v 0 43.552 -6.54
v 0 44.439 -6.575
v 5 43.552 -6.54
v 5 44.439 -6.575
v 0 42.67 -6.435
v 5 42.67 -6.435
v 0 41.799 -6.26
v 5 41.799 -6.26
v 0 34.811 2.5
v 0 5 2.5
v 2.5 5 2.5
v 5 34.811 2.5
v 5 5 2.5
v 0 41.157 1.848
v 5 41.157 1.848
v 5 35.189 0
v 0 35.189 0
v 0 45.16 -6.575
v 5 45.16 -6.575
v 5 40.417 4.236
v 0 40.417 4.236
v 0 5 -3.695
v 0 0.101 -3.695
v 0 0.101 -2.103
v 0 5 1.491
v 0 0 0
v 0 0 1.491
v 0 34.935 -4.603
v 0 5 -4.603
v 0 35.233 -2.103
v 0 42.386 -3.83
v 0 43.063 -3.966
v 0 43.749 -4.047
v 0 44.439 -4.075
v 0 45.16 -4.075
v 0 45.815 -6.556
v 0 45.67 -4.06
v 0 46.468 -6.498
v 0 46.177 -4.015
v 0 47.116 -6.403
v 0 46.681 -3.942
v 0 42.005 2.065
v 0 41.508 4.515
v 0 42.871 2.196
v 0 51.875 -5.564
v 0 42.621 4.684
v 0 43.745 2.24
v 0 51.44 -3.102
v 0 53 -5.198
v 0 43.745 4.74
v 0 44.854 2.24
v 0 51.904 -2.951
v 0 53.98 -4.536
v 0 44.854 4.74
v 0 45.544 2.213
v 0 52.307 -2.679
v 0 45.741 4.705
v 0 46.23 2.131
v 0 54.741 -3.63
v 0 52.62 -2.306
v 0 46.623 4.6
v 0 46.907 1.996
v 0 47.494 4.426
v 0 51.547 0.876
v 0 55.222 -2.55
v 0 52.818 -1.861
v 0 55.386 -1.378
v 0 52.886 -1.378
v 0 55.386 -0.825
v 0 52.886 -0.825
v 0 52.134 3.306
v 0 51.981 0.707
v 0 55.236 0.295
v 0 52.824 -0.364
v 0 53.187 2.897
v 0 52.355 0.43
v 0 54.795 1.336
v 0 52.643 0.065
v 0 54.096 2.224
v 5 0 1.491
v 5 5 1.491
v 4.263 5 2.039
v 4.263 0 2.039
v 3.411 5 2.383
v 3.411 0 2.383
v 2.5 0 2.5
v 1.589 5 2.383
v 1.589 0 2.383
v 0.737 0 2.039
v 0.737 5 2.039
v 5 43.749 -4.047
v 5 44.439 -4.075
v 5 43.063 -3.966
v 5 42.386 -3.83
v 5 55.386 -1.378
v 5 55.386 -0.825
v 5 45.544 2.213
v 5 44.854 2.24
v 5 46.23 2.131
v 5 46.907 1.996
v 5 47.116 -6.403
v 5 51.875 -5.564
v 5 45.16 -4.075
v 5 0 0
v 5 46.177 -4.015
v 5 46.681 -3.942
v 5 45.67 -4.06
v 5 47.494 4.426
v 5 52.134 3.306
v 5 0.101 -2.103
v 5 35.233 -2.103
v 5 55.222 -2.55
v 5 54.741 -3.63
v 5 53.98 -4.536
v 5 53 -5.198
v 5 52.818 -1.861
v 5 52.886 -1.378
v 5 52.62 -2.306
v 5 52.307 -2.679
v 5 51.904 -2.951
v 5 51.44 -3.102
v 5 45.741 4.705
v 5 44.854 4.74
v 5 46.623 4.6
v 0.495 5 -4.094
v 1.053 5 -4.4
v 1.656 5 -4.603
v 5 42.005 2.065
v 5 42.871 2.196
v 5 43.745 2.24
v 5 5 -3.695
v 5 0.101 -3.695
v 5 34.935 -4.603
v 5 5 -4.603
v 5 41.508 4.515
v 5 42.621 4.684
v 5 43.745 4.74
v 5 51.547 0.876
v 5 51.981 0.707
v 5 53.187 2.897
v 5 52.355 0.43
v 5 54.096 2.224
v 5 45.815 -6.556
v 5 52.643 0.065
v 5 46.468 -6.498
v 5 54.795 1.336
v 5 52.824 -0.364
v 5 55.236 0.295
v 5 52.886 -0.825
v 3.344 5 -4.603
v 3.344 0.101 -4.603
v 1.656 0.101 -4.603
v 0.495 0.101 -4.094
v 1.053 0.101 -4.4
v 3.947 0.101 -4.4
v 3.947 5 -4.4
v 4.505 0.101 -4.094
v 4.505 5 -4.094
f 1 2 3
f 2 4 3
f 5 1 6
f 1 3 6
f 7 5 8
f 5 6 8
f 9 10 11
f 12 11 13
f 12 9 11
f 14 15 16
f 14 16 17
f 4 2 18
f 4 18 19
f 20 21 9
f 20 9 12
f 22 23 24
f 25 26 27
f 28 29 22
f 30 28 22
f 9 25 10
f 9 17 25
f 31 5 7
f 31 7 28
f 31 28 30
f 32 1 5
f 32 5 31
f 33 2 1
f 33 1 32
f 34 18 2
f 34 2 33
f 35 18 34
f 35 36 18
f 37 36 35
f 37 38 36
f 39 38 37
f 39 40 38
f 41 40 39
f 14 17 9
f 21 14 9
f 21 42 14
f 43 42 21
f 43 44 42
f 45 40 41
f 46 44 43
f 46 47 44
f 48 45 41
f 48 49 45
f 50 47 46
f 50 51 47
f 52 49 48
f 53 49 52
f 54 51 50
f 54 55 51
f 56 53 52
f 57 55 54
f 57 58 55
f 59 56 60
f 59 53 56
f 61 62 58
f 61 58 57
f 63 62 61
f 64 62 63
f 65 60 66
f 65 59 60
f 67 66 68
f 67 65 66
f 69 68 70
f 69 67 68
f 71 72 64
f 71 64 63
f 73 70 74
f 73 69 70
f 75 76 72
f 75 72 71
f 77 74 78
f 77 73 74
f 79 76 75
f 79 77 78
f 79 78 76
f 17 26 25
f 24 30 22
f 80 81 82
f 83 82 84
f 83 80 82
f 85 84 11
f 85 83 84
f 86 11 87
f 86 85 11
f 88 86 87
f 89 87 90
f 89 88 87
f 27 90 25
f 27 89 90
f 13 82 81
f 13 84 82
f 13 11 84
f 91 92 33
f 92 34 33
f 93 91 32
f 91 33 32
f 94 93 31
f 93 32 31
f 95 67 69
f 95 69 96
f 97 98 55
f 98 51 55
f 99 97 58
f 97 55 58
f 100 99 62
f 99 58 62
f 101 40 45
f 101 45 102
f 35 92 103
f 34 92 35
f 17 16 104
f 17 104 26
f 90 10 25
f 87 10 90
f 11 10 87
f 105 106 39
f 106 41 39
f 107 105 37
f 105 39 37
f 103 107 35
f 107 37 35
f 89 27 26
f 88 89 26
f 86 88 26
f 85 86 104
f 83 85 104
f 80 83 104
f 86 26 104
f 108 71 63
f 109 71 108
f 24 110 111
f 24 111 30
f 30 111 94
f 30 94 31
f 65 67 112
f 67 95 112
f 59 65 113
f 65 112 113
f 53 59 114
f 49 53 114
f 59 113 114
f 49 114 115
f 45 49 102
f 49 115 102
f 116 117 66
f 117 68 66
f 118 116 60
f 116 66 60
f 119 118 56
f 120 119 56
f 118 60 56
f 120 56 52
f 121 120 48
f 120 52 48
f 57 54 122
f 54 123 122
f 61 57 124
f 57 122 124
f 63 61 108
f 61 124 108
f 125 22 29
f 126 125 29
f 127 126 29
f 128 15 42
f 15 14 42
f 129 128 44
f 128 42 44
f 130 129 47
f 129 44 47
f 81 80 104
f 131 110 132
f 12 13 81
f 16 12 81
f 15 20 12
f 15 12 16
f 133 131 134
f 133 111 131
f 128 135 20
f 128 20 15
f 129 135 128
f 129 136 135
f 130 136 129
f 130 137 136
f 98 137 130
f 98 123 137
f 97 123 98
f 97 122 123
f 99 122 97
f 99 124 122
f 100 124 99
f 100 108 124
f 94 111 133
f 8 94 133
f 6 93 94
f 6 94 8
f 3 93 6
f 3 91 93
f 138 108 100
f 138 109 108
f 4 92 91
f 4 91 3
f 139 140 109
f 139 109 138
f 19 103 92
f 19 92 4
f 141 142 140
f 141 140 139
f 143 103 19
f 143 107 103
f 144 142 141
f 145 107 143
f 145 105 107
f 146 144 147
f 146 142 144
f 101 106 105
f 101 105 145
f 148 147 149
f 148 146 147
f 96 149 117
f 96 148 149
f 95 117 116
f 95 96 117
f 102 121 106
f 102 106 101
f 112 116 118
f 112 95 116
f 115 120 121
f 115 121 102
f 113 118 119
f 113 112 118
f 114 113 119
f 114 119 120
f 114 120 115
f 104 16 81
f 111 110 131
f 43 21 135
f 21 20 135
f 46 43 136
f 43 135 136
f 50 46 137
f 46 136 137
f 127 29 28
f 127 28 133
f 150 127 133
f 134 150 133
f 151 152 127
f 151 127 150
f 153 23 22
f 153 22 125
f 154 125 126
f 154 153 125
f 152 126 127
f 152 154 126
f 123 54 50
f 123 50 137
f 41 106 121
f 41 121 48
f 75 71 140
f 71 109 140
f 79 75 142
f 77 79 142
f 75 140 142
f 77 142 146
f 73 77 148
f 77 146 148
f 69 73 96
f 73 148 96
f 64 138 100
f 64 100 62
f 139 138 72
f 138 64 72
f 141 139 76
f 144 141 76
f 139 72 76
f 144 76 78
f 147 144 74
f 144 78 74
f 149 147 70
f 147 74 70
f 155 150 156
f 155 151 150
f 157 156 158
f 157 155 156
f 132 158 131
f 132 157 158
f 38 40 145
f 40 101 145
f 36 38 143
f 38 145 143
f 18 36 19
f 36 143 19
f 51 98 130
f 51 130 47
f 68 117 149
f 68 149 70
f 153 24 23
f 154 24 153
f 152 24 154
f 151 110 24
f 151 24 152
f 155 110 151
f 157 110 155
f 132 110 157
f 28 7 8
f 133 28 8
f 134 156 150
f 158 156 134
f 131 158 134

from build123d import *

# Parameters (mm, degrees)
CROQUIS1_W              = 5
CROQUIS1_H              = 2.5
SALIENTE_EXTRUIR1_DEPTH = 5
CROQUIS2_W              = 5
CROQUIS2_H              = 2.5
CROQUIS3_R              = 5.920836197
CROQUIS3_R_2            = 3.60179698
CORTAR_EXTRUIR1_DEPTH   = 5


with BuildPart() as part:
    # Croquis1 → Saliente-Extruir1 (new body)
    with BuildSketch(Plane(origin=(0, 0, 0), x_dir=(1, 0, 0), z_dir=(0, 1, 0))):
        with Locations((2.5, -1.25)):
            Rectangle(CROQUIS1_W, CROQUIS1_H)
    extrude(amount=SALIENTE_EXTRUIR1_DEPTH)

    # Barrer1: sweep along a curve in space
    with BuildLine() as barrer1_path:
        Line((2.5, 5, 1.25), (2.5, 35, 1.25))
        Line((2.5, 35, 1.25), (2.5, 40.786690732, 3.042424523))
        ThreePointArc((2.5, 40.786690732, 3.042424523), (2.5, 42.249249584, 3.377603579), (2.5, 43.745495261, 3.490174748))
        Line((2.5, 43.745495261, 3.490174748), (2.5, 44.85405472, 3.490174748))
        ThreePointArc((2.5, 44.85405472, 3.490174748), (2.5, 46.035691189, 3.420116101), (2.5, 47.200770887, 3.2109218))
        Line((2.5, 47.200770887, 3.2109218), (2.5, 51.840205401, 2.090901298))
        ThreePointArc((2.5, 51.840205401, 2.090901298), (2.5, 53.493312159, 1.030472895), (2.5, 54.136190551, -0.825322817))
        Line((2.5, 54.136190551, -0.825322817), (2.5, 54.136190551, -1.378271143))
        ThreePointArc((2.5, 54.136190551, -1.378271143), (2.5, 53.43445816, -3.306473933), (2.5, 51.657546553, -4.33262182))
        Line((2.5, 51.657546553, -4.33262182), (2.5, 46.898351702, -5.172479734))
        ThreePointArc((2.5, 46.898351702, -5.172479734), (2.5, 46.032749508, -5.28653041), (2.5, 45.160498363, -5.324644146))
        Line((2.5, 45.160498363, -5.324644146), (2.5, 44.439340414, -5.324644146))
        ThreePointArc((2.5, 44.439340414, -5.324644146), (2.5, 43.257703945, -5.254585498), (2.5, 42.092624247, -5.045391197))
        Line((2.5, 42.092624247, -5.045391197), (2.5, 35.083797871, -3.353368343))
        Line((2.5, 35.083797871, -3.353368343), (2.5, 0.100918739, -3.353368343))
    # Croquis2 → Barrer1 (sweep)
    with BuildSketch(Plane(origin=(0, 5, 0), x_dir=(1, 0, 0), z_dir=(0, 1, 0))):
        with Locations((2.5, -1.25)):
            Rectangle(CROQUIS2_W, CROQUIS2_H)
    sweep(path=barrer1_path.line, transition=Transition.RIGHT)

    # Croquis3 → Cortar-Extruir1 (cut)
    with BuildSketch(Plane.XZ):
        with Locations((2.5, -1.10179698)):
            Circle(CROQUIS3_R)
        with Locations((2.5, -1.10179698)):
            Circle(CROQUIS3_R_2, mode=Mode.SUBTRACT)
    extrude(amount=-CORTAR_EXTRUIR1_DEPTH, mode=Mode.SUBTRACT)


solid = part.part
